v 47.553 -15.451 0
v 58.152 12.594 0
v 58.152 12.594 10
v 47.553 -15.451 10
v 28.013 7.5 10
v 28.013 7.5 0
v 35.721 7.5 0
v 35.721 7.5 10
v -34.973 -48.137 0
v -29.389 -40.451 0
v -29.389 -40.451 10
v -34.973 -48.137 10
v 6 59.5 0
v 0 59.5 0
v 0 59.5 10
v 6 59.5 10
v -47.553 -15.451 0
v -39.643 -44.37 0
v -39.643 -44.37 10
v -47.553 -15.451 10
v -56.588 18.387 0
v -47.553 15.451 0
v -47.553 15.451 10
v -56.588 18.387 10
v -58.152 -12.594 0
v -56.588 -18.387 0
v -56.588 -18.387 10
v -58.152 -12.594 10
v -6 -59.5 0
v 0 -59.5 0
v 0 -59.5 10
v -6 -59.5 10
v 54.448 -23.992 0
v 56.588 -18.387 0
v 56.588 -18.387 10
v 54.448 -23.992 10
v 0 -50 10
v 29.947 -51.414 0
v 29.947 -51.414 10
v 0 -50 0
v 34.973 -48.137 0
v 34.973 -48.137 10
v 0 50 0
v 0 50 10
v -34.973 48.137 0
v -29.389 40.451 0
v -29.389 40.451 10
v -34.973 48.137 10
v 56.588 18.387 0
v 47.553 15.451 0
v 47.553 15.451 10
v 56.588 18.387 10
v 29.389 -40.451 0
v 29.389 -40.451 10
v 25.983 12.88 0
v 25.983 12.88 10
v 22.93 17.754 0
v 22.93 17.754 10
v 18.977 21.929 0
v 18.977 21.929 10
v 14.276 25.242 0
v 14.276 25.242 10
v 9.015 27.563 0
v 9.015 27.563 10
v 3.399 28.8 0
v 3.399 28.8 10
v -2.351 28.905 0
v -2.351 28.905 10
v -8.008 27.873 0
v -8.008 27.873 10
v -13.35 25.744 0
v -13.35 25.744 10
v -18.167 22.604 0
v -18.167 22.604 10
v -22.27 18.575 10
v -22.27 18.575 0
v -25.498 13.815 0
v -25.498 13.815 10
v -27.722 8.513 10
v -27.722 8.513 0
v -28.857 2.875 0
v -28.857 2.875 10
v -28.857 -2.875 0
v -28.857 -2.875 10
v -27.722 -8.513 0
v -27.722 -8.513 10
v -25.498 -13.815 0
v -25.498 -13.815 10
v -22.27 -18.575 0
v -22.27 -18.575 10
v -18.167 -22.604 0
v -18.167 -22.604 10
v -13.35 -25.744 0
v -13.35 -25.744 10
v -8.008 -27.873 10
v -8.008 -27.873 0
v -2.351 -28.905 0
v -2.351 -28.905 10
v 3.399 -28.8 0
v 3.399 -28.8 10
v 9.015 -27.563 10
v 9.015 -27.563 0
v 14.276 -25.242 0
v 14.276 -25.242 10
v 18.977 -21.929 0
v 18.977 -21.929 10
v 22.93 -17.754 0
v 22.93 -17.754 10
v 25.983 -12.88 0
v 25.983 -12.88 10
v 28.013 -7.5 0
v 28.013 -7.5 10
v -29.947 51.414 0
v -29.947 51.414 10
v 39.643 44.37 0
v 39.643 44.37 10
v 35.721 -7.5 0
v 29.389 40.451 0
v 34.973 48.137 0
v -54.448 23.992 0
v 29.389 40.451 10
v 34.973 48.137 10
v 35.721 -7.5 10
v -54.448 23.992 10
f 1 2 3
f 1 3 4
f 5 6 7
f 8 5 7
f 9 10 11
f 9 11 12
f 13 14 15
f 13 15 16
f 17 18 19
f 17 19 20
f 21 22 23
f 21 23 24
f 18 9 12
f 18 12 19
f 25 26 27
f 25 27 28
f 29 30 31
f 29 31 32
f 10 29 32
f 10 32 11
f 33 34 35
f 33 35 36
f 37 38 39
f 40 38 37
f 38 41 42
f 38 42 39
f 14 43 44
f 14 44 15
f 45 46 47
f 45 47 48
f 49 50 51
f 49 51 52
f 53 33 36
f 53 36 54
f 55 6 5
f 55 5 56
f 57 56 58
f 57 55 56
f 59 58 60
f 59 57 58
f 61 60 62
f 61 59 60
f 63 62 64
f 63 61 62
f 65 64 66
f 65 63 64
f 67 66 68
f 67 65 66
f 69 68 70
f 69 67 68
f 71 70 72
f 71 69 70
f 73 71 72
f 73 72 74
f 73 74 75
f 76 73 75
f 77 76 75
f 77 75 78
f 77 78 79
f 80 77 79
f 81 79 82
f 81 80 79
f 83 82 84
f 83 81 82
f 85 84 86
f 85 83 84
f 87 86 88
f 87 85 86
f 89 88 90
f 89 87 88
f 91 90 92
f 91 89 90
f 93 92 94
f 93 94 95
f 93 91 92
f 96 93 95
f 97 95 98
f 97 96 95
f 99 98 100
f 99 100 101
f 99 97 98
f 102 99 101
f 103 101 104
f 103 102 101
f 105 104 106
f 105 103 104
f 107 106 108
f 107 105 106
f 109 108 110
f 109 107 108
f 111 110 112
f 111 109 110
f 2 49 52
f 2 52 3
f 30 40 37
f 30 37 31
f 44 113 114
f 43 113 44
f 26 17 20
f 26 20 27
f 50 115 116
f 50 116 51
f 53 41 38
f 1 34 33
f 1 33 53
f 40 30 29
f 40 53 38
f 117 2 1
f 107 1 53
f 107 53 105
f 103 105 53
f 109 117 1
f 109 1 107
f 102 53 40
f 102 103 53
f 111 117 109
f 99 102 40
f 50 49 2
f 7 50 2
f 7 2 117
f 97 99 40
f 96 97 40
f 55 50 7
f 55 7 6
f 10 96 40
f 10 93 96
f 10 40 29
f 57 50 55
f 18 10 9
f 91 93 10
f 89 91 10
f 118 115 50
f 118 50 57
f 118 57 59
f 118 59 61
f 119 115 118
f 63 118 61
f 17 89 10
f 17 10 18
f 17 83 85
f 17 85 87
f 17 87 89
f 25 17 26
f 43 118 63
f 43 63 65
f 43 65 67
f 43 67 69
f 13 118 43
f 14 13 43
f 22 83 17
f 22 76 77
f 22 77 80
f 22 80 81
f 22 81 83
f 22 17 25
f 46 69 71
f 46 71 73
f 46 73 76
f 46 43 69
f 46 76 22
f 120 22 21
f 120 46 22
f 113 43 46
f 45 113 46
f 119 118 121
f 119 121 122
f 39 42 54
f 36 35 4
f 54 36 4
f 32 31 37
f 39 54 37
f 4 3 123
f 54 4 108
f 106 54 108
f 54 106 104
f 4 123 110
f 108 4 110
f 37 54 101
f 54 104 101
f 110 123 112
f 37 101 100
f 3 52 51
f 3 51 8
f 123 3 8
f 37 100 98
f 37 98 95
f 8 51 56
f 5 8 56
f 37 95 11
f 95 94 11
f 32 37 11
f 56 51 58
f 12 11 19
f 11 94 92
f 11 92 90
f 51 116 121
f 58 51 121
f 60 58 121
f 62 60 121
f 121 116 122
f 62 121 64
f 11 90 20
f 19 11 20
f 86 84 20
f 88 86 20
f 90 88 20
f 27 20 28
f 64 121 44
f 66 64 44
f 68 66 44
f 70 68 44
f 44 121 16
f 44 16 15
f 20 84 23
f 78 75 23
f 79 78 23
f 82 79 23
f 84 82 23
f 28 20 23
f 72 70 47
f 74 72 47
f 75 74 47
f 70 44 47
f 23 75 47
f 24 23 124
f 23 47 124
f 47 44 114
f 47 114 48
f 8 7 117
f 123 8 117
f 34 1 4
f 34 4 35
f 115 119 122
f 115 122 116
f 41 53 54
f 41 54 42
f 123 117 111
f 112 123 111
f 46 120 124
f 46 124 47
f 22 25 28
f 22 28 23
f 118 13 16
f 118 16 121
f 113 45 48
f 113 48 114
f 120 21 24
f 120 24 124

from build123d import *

# Parameters (mm, degrees)
PAD_DEPTH = 10


with BuildPart() as part:
    # Sketch → Pad (new body)
    with BuildSketch(Plane.XY):
        Polygon((-1e-05, 59.5), (5.99999, 59.5), (29.389263, 40.45085), (34.973223, 48.136511), (39.643333, 44.369541), (47.552826, 15.45085), (56.587863, 18.386511), (58.151892, 12.593946), (47.552826, -15.45085), (56.587863, -18.386511), (54.448404, -23.992108), (29.389263, -40.45085), (34.973223, -48.136511), (29.947477, -51.413992), (0, -50), (0, -59.5), (-6, -59.5), (-29.389263, -40.45085), (-34.973223, -48.136511), (-39.643333, -44.369541), (-47.552826, -15.45085), (-56.587863, -18.386511), (-58.151892, -12.593946), (-47.552826, 15.45085), (-56.587863, 18.386511), (-54.448404, 23.992108), (-29.389263, 40.45085), (-34.973223, 48.136511), (-29.947477, 51.413992), (-1e-05, 50), align=None)
        with BuildLine():
            ThreePointArc((28.01339, 7.5), (-29, 0), (28.01339, -7.5))
            Line((35.721142, -7.5), (28.01339, -7.5))
            Line((35.721142, 7.5), (35.721142, -7.5))
            Line((28.01339, 7.5), (35.721142, 7.5))
        make_face(mode=Mode.SUBTRACT)
    extrude(amount=PAD_DEPTH)


solid = part.part
